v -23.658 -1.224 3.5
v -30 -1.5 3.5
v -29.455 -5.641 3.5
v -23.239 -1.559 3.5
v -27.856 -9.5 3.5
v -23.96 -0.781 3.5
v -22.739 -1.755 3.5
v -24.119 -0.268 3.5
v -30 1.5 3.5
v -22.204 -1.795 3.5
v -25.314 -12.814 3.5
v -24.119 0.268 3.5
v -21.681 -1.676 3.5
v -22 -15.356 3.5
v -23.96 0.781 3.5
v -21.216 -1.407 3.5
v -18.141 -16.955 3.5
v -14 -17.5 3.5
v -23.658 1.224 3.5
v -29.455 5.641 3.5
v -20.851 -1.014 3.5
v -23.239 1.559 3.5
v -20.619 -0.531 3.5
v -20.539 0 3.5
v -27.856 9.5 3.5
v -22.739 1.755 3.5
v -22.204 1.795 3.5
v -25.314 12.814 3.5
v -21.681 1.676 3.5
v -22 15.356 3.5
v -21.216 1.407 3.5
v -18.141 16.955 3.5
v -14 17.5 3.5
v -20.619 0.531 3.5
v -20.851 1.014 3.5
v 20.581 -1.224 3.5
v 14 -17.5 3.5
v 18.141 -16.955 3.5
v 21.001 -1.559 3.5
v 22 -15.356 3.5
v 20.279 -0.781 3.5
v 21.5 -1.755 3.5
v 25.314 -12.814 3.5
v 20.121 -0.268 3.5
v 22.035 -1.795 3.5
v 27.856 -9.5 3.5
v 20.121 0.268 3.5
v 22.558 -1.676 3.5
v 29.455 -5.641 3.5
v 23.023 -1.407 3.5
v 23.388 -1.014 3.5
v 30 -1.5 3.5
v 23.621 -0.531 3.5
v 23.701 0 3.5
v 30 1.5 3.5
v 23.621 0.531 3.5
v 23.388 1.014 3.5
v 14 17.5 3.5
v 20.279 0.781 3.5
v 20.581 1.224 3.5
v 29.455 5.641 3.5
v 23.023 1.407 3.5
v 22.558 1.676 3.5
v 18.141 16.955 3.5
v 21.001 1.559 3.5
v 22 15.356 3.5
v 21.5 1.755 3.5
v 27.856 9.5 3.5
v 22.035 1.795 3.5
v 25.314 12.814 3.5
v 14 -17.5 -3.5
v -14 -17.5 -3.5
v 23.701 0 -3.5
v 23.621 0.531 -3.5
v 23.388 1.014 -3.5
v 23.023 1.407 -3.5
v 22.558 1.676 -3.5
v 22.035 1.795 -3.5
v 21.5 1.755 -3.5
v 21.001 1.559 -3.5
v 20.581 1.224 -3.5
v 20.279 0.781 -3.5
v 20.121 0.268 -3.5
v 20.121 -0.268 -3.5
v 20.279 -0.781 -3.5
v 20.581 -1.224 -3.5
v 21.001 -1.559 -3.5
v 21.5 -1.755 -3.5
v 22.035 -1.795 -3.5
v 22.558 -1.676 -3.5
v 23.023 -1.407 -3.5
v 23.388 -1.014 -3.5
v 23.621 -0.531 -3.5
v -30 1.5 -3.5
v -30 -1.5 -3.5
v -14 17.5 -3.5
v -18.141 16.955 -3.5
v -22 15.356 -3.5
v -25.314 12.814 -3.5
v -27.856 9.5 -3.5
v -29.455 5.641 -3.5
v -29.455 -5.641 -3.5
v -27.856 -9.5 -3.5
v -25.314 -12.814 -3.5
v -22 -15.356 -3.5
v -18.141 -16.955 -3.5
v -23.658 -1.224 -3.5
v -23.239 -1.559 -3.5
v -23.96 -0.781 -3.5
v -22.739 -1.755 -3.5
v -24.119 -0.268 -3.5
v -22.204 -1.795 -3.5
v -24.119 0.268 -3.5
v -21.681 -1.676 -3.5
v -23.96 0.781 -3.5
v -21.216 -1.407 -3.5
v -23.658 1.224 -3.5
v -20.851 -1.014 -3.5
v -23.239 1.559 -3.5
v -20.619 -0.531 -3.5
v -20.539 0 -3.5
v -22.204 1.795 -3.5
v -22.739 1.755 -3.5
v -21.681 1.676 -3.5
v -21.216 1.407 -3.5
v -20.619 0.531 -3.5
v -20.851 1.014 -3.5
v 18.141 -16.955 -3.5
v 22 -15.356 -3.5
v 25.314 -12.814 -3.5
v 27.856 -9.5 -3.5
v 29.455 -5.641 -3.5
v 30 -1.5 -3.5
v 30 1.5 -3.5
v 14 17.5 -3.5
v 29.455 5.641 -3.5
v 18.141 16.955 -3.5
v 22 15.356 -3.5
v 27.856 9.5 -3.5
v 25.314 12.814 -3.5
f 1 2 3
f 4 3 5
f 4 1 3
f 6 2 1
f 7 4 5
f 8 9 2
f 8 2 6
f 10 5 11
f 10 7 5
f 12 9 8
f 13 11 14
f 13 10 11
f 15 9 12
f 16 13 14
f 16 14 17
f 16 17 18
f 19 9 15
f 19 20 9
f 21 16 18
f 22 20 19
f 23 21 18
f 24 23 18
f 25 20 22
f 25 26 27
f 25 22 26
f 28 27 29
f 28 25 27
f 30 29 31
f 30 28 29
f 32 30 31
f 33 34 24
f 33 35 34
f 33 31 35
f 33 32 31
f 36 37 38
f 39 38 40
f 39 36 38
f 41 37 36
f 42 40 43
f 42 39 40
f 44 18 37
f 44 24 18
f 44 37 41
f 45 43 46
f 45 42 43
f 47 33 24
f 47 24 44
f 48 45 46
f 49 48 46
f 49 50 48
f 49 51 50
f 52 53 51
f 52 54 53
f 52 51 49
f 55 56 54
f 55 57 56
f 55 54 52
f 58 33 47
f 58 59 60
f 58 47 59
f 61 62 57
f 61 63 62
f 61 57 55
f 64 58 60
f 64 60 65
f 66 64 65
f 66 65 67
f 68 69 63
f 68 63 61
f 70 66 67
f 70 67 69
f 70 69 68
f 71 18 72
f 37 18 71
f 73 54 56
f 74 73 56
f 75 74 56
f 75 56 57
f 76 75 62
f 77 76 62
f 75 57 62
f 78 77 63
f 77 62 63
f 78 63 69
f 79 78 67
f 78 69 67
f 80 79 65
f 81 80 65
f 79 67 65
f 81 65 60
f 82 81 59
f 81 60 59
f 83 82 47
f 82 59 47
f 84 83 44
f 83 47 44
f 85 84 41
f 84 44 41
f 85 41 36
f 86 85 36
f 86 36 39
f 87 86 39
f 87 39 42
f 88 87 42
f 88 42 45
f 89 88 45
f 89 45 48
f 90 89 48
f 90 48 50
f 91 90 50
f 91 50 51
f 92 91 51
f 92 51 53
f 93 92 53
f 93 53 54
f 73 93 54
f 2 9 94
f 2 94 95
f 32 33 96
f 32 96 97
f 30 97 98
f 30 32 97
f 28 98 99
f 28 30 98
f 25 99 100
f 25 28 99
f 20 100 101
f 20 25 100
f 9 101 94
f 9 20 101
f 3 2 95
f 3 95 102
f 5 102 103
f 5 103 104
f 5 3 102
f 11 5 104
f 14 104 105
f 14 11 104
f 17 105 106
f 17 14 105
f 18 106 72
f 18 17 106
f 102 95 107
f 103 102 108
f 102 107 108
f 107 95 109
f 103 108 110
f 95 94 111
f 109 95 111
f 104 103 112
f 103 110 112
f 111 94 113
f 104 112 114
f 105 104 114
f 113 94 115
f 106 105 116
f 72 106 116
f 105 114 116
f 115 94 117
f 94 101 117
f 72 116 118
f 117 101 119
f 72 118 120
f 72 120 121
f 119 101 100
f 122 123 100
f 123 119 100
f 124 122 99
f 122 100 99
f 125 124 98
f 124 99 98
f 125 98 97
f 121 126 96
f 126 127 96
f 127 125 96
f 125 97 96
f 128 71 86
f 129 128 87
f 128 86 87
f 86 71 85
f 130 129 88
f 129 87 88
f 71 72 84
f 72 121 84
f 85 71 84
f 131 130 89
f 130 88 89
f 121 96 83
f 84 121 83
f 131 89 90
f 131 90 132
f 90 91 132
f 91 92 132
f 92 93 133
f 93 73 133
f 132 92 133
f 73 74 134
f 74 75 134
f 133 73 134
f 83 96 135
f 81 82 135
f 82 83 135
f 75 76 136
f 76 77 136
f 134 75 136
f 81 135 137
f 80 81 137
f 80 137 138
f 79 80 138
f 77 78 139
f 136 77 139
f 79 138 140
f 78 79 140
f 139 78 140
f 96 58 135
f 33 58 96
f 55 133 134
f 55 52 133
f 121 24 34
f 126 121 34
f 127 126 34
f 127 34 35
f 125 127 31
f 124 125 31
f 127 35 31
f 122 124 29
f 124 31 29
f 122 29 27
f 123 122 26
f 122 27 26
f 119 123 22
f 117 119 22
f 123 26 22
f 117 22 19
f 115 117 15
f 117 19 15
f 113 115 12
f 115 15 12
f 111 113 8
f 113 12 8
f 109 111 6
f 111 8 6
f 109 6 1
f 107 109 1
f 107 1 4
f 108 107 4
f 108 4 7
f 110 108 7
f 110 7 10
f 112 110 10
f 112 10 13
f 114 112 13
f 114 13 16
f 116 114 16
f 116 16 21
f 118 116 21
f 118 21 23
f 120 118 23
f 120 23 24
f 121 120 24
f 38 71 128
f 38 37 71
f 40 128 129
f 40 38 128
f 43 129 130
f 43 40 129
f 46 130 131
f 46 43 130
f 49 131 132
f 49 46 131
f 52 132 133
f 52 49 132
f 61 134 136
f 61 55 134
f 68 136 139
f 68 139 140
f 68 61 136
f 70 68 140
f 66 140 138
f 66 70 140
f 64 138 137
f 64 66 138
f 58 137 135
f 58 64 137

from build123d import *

# Parameters (mm, degrees)
F1_DEPTH = 3.5
F2_R     = 1.8
F3_DEPTH = 8
F4_R     = 1.8
F5_DEPTH = 8


with BuildPart() as f1:
    # F0 (on Top) → F1 (new body, symmetric)
    with BuildSketch(Plane.XY):
        with BuildLine():
            ThreePointArc((30, 1.5), (25.313708, 12.813708), (14, 17.5))
            Line((14, 17.5), (-14, 17.5))
            ThreePointArc((-14, 17.5), (-25.313708, 12.813708), (-30, 1.5))
            Line((-30, 1.5), (-30, -1.5))
            ThreePointArc((-30, -1.5), (-25.313708, -12.813708), (-14, -17.5))
            Line((-14, -17.5), (14, -17.5))
            ThreePointArc((14, -17.5), (25.313708, -12.813708), (30, -1.5))
            Line((30, -1.5), (30, 1.5))
        make_face()
    extrude(amount=F1_DEPTH, both=True)

    # F2 (on face) → F3 (cut)
    with BuildSketch(Plane.XY.offset(3.5)):
        with Locations((-22.338685, 0)):
            Circle(F2_R)
    extrude(amount=-F3_DEPTH, mode=Mode.SUBTRACT)

    # F4 (on face) → F5 (cut)
    with BuildSketch(Plane.XY.offset(3.5)):
        with Locations((21.90068, 0)):
            Circle(F4_R)
    extrude(amount=-F5_DEPTH, mode=Mode.SUBTRACT)


solid = f1.part
